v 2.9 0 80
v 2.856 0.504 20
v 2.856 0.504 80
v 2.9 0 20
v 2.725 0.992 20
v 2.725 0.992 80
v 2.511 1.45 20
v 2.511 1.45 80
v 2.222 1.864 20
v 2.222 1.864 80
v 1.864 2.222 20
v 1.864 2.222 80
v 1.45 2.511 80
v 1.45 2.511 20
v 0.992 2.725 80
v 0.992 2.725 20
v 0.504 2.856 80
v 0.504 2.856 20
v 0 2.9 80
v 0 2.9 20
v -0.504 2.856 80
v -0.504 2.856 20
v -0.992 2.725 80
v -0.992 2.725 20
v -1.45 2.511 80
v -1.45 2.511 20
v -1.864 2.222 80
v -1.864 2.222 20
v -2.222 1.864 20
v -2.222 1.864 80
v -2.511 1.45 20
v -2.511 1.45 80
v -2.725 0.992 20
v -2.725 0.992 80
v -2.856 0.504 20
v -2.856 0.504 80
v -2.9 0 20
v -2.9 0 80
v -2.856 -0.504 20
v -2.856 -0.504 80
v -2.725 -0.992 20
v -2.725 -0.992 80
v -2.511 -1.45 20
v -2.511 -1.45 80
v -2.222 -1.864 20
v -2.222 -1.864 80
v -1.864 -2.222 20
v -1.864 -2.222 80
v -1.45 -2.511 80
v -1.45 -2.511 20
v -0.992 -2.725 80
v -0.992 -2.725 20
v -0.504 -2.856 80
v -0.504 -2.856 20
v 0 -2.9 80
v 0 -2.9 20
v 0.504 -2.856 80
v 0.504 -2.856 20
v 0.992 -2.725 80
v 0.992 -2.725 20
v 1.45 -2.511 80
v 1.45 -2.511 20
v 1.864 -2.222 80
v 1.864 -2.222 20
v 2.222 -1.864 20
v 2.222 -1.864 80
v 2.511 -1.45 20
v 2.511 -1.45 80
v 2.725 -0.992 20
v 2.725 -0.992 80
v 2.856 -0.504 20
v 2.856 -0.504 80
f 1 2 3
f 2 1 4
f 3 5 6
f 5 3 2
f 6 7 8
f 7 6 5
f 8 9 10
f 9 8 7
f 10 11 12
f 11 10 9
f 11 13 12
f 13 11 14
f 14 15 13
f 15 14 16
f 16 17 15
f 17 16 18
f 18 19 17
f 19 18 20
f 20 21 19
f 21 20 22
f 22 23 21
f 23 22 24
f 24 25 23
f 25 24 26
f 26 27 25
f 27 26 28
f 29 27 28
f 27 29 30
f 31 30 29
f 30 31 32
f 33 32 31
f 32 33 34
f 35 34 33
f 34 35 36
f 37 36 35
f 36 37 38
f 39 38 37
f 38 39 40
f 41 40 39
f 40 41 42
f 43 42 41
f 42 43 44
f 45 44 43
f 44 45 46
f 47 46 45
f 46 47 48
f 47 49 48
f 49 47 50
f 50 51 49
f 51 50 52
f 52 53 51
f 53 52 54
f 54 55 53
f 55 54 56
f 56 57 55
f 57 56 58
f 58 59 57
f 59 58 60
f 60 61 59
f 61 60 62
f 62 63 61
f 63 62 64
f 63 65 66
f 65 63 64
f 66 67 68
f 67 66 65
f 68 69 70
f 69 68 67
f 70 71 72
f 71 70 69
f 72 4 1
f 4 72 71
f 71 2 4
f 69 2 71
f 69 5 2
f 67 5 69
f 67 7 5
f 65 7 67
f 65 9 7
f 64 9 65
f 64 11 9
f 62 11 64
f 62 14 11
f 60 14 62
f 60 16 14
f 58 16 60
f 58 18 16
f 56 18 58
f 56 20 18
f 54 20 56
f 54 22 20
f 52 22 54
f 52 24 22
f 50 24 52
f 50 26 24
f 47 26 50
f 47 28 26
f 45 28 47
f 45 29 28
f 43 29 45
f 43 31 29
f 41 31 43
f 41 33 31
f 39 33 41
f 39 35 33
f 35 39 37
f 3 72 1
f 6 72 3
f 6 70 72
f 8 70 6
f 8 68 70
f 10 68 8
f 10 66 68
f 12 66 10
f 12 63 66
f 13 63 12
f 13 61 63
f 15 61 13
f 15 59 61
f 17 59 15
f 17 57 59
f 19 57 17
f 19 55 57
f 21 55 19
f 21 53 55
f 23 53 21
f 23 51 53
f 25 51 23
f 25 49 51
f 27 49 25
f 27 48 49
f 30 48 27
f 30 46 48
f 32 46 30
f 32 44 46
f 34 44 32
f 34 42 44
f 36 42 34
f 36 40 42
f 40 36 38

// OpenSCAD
color(alpha = 1.0000000000, c = [0.5000000000, 0.5000000000, 0.5000000000]) {
	union() {
		translate(v = [0, 0, 20]) {
			cylinder($fn = 36, h = 60, r = 2.9000000000);
		}
	}
}
